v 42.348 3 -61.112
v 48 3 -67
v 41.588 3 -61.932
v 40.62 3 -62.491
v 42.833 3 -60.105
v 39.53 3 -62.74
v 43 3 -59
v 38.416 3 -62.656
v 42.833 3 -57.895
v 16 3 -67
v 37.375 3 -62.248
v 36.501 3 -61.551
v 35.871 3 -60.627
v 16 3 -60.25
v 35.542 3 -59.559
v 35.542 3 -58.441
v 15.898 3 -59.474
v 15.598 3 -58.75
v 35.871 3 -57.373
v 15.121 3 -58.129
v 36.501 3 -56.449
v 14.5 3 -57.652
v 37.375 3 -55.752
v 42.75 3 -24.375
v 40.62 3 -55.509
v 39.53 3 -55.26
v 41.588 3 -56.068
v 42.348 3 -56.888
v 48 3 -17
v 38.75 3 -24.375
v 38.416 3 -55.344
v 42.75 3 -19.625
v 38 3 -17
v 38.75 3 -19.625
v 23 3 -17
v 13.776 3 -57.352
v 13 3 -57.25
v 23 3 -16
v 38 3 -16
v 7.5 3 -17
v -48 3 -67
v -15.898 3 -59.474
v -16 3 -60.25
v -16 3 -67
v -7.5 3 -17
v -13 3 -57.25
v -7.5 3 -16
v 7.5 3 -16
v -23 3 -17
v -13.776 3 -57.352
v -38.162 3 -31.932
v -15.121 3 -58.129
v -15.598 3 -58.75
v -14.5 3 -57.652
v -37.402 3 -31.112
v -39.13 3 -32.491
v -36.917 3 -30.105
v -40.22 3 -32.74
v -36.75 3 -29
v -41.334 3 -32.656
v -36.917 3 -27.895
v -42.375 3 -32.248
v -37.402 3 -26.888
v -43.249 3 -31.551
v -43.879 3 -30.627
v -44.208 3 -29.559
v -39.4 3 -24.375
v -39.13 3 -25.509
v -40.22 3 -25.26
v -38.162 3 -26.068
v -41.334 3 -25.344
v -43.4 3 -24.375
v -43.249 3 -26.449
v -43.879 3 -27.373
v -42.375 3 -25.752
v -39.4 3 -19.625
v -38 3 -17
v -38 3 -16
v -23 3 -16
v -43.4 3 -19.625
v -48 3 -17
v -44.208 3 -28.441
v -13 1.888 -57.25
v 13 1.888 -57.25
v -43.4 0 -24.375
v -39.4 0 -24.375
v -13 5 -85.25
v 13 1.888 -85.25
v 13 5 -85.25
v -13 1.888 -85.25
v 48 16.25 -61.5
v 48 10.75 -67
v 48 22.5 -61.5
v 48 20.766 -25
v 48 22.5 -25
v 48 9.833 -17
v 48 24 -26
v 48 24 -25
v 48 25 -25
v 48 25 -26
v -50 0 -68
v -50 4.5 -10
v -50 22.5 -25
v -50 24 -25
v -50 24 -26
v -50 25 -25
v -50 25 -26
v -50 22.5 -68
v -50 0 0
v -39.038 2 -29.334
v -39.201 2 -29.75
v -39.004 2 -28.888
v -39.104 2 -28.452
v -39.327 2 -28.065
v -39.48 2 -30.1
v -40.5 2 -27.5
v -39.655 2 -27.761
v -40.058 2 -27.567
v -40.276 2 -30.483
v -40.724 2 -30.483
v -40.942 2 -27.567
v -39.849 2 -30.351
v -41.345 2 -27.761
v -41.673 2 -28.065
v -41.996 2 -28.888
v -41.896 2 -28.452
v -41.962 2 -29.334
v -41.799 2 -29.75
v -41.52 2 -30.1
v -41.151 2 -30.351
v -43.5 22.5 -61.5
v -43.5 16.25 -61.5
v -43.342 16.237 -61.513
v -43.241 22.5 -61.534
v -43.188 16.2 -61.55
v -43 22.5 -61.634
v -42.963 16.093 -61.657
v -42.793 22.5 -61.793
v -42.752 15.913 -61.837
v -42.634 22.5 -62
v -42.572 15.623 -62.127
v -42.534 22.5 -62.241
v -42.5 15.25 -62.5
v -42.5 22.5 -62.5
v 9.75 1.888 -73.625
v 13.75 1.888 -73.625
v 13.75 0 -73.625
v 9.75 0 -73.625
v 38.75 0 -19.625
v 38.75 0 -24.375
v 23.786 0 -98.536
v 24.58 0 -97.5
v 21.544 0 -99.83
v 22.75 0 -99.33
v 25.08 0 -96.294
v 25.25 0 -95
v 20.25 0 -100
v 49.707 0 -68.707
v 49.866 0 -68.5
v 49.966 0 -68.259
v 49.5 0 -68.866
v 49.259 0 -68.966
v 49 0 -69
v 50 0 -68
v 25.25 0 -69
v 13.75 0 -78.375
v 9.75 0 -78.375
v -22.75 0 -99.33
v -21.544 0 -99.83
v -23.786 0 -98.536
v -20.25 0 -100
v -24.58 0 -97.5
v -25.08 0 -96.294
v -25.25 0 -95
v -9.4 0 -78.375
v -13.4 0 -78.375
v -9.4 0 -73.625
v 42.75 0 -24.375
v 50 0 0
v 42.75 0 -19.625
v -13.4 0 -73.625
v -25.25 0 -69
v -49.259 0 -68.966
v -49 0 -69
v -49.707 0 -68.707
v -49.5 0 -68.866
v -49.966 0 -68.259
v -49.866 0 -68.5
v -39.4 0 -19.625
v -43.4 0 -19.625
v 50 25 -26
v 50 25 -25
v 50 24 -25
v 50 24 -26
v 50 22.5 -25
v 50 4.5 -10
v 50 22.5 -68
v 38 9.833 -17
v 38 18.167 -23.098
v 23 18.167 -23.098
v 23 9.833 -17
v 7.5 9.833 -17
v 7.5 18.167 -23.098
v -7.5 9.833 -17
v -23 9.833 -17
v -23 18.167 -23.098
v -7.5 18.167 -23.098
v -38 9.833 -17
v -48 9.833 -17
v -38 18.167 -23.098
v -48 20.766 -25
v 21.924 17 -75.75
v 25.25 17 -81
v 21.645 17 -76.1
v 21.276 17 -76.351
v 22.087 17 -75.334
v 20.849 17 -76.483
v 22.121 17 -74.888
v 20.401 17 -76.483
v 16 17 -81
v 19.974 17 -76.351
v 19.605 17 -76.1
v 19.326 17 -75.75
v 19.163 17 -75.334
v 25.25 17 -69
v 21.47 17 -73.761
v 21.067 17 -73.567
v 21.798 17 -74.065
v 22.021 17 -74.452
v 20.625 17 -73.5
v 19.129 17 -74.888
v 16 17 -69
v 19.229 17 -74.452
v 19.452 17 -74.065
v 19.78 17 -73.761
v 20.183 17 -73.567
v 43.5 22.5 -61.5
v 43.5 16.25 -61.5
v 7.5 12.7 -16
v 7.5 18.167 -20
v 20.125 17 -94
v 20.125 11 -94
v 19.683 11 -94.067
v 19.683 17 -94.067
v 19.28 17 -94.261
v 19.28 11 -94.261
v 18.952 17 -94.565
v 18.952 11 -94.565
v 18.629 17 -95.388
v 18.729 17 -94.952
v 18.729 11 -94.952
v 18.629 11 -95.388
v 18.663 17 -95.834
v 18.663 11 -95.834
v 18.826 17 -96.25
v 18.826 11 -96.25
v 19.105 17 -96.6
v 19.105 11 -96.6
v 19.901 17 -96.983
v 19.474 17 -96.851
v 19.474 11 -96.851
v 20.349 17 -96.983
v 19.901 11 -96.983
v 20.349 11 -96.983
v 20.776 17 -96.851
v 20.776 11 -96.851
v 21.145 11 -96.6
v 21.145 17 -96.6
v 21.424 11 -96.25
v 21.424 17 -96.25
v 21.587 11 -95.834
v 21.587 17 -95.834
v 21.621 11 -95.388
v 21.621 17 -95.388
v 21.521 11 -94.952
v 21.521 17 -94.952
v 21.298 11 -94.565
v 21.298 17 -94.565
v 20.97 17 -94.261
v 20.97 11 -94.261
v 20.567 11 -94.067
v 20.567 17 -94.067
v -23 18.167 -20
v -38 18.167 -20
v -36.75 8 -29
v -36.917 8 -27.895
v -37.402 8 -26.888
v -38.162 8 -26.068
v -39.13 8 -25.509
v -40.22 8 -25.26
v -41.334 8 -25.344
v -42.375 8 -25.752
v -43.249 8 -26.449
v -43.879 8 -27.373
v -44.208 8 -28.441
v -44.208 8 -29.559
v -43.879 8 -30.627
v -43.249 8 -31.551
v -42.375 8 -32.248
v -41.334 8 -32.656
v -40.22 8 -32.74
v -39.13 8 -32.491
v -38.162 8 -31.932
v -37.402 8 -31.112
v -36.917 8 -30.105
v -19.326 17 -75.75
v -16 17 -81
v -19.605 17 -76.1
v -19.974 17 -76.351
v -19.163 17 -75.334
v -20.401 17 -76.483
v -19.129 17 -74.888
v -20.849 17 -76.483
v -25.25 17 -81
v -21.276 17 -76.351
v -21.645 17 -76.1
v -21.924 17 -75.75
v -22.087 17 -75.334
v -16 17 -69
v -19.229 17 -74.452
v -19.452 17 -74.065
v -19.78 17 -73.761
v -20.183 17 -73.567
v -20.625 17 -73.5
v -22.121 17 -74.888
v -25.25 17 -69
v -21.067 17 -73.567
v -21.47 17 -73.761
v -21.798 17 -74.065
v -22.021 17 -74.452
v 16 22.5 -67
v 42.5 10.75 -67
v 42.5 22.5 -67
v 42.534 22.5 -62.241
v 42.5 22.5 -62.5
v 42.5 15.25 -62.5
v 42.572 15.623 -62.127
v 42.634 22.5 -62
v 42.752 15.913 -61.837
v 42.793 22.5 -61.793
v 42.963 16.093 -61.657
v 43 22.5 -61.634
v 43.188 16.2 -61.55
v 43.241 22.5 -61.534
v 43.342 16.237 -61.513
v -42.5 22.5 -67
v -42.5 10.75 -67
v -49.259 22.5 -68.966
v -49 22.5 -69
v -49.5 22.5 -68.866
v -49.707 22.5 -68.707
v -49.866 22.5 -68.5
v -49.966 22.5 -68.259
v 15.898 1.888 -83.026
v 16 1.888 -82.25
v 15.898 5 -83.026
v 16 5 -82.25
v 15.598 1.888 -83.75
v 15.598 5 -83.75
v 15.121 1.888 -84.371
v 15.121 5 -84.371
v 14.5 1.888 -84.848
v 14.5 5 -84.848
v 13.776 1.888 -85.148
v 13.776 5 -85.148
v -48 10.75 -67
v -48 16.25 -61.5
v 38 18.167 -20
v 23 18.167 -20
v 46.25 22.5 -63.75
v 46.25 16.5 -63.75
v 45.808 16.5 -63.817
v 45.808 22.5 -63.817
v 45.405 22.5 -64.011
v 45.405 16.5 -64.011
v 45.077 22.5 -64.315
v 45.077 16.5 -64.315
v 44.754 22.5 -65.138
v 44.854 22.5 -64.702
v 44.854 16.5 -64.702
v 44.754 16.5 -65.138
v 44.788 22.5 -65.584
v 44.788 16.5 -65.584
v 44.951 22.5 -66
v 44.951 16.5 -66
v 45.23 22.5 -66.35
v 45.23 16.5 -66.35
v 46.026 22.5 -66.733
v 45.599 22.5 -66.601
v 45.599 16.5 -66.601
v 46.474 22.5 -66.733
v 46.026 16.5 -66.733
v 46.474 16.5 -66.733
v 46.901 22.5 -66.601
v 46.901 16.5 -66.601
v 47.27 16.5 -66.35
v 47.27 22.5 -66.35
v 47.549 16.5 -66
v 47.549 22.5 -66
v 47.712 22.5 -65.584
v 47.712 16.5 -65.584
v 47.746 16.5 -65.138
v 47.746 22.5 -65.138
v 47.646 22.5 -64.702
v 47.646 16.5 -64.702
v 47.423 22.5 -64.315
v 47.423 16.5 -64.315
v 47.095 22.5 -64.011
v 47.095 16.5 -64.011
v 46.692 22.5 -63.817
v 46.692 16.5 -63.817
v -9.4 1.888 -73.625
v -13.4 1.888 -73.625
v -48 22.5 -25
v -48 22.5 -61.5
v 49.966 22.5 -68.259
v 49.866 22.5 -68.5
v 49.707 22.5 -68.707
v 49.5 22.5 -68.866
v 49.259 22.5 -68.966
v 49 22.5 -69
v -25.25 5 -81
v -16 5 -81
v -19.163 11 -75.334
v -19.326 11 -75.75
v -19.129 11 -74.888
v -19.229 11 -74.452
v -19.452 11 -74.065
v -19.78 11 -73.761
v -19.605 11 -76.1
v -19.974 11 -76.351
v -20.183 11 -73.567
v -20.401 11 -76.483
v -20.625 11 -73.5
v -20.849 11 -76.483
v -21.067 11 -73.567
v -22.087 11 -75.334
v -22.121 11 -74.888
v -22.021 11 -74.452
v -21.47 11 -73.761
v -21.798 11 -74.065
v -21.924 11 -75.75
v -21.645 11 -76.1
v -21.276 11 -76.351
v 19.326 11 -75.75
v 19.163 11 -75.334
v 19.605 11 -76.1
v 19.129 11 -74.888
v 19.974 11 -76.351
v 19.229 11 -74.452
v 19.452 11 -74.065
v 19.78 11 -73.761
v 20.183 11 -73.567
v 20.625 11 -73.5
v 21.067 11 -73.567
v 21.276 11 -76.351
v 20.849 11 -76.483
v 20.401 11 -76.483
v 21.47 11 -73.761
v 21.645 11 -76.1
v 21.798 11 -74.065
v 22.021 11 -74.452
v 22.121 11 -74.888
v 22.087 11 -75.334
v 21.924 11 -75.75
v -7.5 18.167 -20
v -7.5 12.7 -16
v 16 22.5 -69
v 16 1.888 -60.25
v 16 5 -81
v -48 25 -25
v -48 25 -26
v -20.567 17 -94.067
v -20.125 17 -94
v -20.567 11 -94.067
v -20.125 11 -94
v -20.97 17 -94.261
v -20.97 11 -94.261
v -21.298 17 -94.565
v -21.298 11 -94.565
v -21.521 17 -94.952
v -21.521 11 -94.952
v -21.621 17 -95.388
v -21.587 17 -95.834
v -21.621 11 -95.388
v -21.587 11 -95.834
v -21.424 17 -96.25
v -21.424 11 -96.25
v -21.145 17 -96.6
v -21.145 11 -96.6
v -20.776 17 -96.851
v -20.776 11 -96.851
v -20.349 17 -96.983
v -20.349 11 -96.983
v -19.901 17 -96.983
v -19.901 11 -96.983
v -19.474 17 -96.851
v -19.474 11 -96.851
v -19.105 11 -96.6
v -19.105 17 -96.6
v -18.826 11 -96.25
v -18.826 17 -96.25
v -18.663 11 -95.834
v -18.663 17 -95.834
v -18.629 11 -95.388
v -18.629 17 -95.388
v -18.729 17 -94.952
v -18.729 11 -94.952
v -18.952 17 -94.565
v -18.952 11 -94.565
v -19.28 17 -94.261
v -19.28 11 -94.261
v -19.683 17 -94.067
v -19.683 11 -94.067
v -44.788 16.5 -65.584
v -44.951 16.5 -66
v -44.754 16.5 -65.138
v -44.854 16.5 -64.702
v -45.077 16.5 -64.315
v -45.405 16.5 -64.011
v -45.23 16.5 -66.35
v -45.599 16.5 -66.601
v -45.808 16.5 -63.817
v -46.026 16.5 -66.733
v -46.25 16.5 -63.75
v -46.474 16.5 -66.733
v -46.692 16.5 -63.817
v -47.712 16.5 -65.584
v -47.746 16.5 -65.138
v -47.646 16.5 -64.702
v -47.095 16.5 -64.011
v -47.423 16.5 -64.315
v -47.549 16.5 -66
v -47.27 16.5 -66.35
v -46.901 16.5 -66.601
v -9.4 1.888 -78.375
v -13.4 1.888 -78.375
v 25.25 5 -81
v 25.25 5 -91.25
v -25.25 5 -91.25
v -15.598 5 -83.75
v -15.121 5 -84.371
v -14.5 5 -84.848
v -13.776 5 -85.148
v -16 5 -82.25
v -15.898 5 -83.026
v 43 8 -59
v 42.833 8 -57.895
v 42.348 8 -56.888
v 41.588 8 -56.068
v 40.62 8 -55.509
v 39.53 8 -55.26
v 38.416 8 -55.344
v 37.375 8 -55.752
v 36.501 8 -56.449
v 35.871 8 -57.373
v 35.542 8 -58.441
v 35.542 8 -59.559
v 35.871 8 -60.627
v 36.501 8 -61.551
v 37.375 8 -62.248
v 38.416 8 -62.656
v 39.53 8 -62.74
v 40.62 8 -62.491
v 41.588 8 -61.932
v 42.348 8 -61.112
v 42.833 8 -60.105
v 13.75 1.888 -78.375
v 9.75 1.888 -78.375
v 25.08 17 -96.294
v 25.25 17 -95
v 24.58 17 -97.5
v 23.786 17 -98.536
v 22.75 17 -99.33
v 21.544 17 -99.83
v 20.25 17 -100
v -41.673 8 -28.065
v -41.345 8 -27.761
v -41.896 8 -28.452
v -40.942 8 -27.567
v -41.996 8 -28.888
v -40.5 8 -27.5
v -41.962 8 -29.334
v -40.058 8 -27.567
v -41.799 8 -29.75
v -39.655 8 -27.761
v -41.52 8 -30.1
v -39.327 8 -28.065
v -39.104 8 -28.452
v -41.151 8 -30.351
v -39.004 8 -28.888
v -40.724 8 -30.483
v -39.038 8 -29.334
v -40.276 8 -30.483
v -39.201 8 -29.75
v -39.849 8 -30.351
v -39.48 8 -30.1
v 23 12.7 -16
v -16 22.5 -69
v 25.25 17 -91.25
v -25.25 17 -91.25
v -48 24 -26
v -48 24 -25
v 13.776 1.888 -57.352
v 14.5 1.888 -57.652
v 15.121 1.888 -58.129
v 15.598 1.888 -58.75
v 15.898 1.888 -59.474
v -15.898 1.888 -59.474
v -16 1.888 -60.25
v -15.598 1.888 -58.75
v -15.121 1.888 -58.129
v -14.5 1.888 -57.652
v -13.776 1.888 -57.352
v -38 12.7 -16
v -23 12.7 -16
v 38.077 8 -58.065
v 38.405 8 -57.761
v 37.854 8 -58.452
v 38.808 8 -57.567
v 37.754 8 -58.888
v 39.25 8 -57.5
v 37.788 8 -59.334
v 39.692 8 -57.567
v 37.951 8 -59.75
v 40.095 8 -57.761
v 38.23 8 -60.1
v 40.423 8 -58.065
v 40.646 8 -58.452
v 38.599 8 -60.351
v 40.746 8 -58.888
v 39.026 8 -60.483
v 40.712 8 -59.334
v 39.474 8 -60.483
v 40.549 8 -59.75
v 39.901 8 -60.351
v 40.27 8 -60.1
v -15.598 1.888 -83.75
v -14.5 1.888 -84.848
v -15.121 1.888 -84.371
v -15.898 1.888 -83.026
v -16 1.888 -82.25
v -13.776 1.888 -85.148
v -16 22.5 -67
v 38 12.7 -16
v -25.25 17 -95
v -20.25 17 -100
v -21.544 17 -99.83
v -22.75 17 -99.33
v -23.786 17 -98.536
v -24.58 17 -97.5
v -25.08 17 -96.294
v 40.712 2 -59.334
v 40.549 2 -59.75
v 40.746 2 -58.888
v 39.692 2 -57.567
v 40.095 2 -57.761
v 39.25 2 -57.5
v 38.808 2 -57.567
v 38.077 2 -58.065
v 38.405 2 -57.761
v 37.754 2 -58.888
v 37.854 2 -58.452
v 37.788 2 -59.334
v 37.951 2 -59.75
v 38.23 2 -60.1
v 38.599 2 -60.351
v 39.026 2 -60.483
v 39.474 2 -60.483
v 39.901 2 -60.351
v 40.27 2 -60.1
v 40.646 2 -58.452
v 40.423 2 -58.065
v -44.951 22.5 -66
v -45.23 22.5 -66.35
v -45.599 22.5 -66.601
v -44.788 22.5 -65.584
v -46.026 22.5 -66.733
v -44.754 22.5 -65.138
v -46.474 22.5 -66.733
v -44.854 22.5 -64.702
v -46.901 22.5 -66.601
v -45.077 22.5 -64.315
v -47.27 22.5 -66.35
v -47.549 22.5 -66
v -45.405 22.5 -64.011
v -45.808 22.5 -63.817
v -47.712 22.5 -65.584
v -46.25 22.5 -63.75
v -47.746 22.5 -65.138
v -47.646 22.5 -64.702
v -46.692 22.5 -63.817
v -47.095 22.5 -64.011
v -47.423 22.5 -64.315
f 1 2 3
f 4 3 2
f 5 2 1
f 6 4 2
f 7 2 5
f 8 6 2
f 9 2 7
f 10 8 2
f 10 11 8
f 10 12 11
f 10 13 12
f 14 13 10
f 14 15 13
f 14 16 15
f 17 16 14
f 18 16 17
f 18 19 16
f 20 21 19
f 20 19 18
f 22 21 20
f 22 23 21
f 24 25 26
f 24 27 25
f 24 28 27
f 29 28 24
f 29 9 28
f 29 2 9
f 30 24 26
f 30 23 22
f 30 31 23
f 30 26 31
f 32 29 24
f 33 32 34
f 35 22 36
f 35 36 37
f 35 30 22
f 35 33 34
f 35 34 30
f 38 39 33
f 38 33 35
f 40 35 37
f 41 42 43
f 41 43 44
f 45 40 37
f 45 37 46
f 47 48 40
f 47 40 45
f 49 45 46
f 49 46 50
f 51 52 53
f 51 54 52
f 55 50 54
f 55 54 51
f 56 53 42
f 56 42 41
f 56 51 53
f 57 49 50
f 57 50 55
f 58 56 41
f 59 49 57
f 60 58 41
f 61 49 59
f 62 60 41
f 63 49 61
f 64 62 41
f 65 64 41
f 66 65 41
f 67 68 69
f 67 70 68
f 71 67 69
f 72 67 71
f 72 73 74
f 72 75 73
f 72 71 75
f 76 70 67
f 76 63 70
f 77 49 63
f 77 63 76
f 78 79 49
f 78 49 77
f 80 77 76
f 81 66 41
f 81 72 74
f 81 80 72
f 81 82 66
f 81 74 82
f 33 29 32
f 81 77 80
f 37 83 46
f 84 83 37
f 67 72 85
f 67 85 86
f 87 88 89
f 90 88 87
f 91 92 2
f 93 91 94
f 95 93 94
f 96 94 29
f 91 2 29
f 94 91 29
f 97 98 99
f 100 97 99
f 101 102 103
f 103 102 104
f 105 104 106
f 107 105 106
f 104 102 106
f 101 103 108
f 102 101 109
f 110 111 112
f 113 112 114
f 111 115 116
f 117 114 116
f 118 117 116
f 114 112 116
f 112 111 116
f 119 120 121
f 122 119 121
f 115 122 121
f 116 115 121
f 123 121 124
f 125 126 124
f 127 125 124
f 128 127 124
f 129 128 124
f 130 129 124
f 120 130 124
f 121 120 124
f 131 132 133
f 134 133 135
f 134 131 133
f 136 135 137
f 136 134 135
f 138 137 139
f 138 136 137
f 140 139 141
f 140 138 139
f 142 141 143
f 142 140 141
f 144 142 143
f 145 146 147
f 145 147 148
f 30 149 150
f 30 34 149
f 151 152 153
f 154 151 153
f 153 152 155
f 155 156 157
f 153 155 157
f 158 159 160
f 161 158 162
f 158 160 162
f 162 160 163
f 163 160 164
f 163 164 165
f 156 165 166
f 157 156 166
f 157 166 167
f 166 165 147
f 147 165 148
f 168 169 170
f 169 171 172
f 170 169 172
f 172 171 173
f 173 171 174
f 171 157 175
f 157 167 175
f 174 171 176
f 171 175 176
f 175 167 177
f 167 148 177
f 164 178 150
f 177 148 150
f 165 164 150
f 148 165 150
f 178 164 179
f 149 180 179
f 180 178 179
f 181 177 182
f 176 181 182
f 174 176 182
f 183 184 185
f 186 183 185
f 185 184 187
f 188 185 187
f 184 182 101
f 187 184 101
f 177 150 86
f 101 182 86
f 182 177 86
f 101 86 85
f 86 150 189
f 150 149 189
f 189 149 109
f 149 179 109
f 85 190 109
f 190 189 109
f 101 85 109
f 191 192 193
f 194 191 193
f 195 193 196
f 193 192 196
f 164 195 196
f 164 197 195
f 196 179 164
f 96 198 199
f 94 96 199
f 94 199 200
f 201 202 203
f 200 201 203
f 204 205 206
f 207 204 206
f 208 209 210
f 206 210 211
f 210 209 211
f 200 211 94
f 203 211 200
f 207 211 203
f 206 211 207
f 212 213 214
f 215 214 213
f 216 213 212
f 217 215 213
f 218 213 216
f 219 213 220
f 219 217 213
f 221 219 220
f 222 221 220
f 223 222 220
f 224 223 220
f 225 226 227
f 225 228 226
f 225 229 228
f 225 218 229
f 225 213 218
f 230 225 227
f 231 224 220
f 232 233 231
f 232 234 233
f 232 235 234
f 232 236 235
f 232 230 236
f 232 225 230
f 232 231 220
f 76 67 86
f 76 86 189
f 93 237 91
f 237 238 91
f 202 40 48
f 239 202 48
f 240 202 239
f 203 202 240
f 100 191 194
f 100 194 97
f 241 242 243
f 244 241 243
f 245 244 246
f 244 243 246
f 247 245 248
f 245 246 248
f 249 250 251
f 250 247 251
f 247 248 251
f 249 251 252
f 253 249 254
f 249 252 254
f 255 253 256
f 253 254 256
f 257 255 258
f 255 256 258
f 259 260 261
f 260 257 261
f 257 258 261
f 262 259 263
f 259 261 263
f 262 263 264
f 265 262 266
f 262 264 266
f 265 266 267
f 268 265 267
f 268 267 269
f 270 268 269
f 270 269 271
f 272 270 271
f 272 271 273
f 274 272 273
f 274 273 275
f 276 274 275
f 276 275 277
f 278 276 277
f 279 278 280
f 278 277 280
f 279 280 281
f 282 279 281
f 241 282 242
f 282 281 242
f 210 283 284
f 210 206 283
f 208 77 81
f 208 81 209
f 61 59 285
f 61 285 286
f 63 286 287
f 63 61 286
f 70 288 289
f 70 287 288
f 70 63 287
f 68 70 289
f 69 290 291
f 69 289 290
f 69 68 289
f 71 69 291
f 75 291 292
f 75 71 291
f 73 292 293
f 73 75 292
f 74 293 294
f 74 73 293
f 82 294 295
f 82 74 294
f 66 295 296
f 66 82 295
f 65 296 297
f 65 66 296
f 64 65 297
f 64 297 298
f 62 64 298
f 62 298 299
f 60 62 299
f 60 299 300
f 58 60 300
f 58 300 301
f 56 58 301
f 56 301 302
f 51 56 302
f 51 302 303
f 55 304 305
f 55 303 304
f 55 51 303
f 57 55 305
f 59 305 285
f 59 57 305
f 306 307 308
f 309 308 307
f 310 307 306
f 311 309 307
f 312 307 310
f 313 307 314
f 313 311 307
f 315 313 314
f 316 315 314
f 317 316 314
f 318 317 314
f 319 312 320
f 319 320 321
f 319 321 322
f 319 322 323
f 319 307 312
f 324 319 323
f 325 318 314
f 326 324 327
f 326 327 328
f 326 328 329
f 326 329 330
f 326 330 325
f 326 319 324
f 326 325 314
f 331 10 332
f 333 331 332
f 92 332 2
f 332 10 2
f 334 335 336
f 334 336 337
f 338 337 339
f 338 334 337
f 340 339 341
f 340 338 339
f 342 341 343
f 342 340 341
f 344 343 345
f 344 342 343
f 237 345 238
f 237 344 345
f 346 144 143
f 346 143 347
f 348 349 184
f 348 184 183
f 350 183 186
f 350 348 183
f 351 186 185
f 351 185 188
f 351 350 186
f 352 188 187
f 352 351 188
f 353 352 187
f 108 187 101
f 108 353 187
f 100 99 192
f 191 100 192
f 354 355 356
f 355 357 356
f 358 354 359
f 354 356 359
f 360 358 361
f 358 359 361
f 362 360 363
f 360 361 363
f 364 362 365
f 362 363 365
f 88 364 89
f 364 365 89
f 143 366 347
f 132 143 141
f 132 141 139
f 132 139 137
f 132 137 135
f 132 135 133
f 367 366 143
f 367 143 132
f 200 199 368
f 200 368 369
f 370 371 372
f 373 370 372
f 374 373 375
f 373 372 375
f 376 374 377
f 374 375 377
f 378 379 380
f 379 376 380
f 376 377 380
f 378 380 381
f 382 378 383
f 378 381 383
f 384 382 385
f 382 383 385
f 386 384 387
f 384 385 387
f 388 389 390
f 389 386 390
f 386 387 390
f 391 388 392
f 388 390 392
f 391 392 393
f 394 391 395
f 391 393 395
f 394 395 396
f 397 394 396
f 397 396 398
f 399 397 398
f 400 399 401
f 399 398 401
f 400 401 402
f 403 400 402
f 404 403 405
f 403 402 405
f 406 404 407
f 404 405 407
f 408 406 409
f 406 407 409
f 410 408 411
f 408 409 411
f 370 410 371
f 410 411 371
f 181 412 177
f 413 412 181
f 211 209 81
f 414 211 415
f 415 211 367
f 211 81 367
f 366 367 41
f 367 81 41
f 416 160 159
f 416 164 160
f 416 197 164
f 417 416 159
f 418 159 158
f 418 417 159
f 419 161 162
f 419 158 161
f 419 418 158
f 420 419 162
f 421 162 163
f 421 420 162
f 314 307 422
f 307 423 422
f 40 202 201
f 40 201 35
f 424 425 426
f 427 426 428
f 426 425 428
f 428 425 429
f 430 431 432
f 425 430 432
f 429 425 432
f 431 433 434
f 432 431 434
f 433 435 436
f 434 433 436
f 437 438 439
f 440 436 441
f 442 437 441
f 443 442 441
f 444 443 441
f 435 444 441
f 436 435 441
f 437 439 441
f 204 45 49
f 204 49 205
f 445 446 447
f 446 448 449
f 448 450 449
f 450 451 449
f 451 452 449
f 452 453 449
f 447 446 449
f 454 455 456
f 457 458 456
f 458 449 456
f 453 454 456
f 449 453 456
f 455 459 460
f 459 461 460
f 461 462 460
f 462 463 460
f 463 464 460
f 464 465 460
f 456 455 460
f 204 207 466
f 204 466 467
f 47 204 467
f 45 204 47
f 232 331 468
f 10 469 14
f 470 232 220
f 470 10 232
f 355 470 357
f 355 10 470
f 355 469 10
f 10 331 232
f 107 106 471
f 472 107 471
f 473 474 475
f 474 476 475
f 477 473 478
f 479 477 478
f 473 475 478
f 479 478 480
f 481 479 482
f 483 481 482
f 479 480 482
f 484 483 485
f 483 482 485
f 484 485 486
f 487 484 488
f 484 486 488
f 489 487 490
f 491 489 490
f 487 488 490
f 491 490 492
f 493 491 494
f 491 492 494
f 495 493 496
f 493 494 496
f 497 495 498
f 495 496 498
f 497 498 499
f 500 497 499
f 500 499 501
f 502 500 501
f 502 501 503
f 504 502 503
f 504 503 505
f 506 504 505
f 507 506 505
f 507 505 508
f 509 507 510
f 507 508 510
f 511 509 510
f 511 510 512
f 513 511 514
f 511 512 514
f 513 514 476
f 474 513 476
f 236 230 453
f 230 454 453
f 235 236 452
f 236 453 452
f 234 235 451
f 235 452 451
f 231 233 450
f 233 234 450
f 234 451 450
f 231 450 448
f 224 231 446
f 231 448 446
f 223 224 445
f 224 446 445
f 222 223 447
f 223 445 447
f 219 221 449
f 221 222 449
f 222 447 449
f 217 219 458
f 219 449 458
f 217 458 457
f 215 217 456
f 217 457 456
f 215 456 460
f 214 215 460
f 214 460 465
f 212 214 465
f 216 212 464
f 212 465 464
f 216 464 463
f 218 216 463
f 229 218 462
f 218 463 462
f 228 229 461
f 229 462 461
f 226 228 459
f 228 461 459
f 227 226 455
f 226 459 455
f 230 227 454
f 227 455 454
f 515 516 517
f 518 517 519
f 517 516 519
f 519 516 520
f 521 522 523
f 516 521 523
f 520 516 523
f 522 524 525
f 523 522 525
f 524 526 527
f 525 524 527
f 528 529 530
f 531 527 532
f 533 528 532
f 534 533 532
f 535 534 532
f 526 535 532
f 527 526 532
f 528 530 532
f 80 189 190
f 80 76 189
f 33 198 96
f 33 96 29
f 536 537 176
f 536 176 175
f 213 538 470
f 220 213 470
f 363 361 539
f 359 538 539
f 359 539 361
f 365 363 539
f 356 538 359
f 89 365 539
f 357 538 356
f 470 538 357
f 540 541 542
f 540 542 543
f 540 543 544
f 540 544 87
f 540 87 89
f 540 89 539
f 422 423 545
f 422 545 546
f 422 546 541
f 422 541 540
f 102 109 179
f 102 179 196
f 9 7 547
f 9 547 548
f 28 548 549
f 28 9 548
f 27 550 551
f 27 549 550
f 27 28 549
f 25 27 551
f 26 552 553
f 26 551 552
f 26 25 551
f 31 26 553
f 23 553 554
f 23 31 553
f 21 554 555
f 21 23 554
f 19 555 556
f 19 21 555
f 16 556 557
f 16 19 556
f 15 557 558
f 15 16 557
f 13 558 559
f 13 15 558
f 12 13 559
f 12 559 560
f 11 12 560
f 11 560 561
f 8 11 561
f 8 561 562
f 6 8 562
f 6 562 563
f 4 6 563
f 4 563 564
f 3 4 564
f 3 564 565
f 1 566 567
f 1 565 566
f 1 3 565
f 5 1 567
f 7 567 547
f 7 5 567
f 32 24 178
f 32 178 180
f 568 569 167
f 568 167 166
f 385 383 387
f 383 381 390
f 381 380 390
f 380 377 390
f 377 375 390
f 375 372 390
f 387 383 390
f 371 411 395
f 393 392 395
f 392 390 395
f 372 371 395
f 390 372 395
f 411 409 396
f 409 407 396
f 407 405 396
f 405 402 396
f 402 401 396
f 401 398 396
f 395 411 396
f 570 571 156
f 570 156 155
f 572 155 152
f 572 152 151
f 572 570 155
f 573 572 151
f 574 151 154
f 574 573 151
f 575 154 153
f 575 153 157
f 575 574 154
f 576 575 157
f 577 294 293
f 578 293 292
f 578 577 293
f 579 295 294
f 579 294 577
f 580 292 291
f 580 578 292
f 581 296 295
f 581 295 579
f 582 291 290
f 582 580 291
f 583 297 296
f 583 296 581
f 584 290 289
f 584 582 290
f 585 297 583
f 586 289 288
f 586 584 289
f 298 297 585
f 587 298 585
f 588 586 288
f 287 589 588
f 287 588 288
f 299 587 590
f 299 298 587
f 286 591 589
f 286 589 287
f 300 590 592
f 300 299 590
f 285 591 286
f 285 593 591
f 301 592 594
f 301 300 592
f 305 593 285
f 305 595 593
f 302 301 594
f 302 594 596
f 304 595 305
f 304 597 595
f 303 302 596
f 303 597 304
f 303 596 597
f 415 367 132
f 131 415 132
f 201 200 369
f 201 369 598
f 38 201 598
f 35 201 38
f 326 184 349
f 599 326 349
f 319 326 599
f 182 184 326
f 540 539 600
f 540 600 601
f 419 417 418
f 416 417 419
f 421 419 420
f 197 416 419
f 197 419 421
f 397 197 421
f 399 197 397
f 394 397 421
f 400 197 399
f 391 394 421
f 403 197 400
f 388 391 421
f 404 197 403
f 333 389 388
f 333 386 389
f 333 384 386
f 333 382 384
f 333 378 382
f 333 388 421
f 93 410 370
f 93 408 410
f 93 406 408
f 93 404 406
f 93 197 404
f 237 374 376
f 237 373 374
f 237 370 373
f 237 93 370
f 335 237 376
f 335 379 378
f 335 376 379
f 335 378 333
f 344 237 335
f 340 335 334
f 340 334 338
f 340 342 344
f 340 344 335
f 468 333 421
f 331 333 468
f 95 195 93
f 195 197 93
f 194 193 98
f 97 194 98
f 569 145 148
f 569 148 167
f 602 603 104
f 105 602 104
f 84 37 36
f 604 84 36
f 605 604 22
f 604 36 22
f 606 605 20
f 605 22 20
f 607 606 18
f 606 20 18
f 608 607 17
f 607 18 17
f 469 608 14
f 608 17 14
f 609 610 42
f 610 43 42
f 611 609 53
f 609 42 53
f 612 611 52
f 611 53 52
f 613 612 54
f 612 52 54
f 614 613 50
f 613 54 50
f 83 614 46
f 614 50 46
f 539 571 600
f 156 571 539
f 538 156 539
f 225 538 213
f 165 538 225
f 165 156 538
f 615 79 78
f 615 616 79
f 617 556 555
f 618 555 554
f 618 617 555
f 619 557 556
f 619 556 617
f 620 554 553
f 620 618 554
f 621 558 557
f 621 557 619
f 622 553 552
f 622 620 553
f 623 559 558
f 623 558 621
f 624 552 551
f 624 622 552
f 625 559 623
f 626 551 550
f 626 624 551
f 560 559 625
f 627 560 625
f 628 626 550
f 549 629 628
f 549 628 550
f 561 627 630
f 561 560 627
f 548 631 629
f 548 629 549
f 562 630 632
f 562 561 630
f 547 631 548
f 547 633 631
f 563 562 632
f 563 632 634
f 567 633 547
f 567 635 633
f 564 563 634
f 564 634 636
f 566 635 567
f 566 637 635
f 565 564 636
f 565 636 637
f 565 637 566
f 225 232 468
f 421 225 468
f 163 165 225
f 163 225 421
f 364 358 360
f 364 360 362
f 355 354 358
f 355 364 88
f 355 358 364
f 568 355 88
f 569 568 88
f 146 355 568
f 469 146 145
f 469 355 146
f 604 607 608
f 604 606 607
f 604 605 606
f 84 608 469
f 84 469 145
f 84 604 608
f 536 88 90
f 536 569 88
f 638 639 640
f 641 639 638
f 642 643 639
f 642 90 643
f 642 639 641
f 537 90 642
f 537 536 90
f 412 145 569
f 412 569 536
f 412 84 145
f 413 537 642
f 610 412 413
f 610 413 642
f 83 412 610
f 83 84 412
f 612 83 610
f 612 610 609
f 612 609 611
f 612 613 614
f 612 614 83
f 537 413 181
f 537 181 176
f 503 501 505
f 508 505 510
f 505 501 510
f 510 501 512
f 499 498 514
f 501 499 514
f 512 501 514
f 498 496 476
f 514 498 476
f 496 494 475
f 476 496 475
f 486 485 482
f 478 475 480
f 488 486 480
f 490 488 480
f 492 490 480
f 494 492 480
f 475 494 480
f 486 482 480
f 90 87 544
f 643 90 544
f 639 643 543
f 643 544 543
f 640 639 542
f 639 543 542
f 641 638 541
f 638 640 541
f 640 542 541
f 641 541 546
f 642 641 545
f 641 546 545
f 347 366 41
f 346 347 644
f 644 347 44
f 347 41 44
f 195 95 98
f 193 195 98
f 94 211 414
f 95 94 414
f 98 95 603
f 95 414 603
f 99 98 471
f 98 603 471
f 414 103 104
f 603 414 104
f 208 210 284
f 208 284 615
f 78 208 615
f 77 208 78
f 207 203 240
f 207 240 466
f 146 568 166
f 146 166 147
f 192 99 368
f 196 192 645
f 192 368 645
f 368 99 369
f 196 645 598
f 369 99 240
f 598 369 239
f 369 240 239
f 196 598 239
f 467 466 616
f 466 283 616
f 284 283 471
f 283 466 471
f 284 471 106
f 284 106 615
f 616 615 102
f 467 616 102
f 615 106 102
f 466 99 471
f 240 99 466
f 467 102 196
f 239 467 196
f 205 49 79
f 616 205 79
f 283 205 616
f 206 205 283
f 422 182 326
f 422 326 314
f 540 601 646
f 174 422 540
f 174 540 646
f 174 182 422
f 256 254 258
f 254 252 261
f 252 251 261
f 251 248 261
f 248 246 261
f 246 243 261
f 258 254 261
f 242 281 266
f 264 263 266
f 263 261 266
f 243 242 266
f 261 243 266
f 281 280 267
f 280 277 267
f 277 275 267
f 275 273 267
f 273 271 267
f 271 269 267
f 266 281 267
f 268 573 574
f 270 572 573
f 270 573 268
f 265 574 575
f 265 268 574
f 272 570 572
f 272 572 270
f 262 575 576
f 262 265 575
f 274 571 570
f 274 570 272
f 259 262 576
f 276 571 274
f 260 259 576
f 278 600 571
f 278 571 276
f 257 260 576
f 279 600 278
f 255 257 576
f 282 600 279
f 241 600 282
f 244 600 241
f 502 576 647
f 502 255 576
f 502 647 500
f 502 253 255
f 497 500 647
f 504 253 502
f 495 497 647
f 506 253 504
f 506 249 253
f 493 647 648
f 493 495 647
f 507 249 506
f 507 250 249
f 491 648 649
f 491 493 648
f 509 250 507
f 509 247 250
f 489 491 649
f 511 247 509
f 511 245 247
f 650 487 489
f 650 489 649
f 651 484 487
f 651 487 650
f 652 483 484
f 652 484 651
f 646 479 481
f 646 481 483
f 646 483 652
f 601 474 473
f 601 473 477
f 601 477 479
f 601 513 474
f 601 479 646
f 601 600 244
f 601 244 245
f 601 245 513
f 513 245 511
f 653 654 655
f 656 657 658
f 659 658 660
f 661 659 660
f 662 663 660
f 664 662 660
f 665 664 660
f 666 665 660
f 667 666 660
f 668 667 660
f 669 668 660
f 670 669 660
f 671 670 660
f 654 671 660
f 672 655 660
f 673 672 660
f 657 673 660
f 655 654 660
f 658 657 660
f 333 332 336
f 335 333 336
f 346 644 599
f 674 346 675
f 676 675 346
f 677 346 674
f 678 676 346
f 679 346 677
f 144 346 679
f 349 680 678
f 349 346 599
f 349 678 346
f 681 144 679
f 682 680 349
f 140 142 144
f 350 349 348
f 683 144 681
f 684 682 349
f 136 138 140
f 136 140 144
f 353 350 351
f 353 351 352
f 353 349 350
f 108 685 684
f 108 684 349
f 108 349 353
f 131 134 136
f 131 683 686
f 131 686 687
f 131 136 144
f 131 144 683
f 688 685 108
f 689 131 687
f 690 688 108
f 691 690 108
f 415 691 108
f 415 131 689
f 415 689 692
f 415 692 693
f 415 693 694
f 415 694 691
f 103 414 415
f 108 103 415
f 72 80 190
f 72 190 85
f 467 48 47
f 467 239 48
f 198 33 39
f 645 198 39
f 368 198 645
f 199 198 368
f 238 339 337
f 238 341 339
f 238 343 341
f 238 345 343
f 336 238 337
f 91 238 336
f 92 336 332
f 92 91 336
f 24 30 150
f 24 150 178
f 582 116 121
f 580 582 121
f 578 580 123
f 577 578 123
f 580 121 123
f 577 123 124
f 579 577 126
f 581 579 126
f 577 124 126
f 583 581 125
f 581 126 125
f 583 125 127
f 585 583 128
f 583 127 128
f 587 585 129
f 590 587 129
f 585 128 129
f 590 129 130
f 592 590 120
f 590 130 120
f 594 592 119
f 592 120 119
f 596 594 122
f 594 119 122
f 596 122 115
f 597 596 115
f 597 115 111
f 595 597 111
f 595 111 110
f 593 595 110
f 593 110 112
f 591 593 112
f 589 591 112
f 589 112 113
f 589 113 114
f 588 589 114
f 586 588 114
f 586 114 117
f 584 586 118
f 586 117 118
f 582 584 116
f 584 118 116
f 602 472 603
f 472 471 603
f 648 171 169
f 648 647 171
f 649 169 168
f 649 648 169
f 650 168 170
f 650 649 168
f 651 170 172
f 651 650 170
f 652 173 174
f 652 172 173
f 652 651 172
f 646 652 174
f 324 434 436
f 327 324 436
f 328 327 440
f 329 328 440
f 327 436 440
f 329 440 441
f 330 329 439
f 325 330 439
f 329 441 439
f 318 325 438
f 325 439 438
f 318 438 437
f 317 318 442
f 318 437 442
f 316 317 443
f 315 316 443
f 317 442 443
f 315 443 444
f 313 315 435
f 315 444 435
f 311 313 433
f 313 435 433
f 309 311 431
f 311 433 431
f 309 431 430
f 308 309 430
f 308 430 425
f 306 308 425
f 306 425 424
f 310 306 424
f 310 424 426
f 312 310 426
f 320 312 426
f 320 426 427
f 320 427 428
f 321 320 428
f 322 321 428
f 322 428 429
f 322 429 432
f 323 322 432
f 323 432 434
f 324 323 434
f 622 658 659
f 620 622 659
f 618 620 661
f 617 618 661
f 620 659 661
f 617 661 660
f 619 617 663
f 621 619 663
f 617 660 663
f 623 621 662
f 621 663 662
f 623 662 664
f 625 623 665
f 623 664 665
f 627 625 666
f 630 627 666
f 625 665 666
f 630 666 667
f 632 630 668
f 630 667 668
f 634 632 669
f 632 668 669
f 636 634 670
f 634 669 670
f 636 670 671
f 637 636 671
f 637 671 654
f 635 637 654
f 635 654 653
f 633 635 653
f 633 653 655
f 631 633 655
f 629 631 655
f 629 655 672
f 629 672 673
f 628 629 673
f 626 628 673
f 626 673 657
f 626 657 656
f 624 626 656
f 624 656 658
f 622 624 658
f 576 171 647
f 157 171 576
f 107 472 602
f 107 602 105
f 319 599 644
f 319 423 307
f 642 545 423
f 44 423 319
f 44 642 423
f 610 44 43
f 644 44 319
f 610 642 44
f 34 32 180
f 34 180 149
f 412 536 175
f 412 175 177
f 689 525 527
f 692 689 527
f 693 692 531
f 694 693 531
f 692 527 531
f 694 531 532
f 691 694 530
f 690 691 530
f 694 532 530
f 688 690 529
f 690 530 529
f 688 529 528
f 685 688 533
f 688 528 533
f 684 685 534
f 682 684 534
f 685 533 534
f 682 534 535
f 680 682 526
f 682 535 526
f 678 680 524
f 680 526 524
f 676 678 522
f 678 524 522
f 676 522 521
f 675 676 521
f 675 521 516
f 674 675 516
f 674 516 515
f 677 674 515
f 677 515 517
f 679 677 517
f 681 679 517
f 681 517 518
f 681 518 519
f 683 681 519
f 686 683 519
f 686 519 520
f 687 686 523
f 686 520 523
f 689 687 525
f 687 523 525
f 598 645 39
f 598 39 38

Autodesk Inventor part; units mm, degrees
ref_plane "YZ Plane" through (0, 0, 0) normal (1, 0, 0) x (0, 1, 0)
ref_plane "XZ Plane" through (0, 0, 0) normal (0, 1, 0) x (-1, 0, 0)
ref_plane "XY Plane" through (0, 0, 0) normal (0, 0, 1) x (1, 0, 0)
sketch "Náčrt1" plane through (0, 0, 0) normal (0, 1, 0) x (-1, 0, 0)
  line L0 (0, 0) -> (50, 0)
  line L1 (50, 0) -> (50, -69)
  line L2 (50, -69) -> (16, -69)
  line L3 (16, -69) -> (16, -81)
  line L4 (16, -81) -> (25.25, -81)
  line L5 (25.25, -81) -> (25.25, -69)
  line L6 (25.25, -81) -> (25.25, -91.25)
  line L7 (25.25, -91.25) -> (25.25, -100)
  line L8 (25.25, -100) -> (0, -100)
  line L9 (0, -100) -> (0, -91.25)
  line L10 (0, -91.25) -> (25.25, -91.25)
  line L11 (0, -91.25) -> (0, -85.25)
  line L12 (0, -85.25) -> (16, -85.25)
  line L13 (16, -85.25) -> (16, -81)
  line L14 (0, -85.25) -> (0, 0)
  line L15 (16, -69) -> (16, -57.25)
  line L16 (16, -57.25) -> (0, -57.25)
  line L17 (48, -25) -> (48, -61.5)
  line L18 (48, -61.5) -> (42.5, -61.5)
  line L19 (42.5, -61.5) -> (42.5, -67)
  line L20 (42.5, -67) -> (16, -67)
  line L21 (0, -25) -> (48, -25)
  dimension "d0" = 50
  dimension "d1" = 69
  dimension "d2" = 12
  dimension "d3" = 10.25
  dimension "d4" = 8.75
  dimension "d5" = 25.25
  dimension "d6" = 16
  dimension "d7" = 6
  dimension "d9" = 2
  dimension "d10" = 7.5
  dimension "d11" = 7.5
  dimension "d12" = 28
  dimension "d13" = 25
  dimension "d18" = 2
extrude "Vysunutí1" add sketch "Náčrt1" along normal blind 3 contours L21 L17 L18 L19 L20 L15 L16 L14
extrude "Vysunutí2" add sketch "Náčrt1" along normal blind 1.888 contours L16 L15 L3 L13 L12 L14
extrude "Vysunutí3" add sketch "Náčrt1" along normal blind 22.5 contours L0 L1 L2 L15 L20 L19 L18 L17 L21 L14
extrude "Vysunutí4" add sketch "Náčrt1" along normal blind 17 contours L5 L4 L3 L2 | L10 L7 L8 L9
extrude "Vysunutí15" add sketch "Náčrt1" along normal blind 5 contours L12 L13 L4 L6 L10 L11
sketch "Náčrt15" plane through (-48, 3, -61.5) normal (1, 0, 0) x (0, 0, -1)
  line L0 (5.5, 0) -> (5.5, 19.5) projected
  line L1 (0, 0) -> (0, 19.5) projected
  line L2 (0, 0) -> (5.5, 0)
  line L3 (5.5, 0) -> (5.5, 7.75)
  line L4 (5.5, 0) -> (5.5, 19.5) projected
  line L5 (5.5, 7.75) -> (0, 13.25)
  line L6 (0, 0) -> (0, 13.25)
  line L7 (0, 19.5) -> (5.5, 19.5) projected
  line L8 (0, 0) -> (-36.5, 0) projected
  point P0 (-61.5, -3)
  point P1 (5.5, 7.75)
  point P2 (2.75, 19.5)
  point P3 (2.75, 10.5)
  dimension "d107" = 45
  dimension "d110" = 9
extrude "Vysunutí14" cut sketch "Náčrt15" along normal up to surface (5.5 mm away) contours L2 L1 L5 L0
sketch "Náčrt2" plane through (-50, 0, -69) normal (-1, 0, 0) x (0, 0, 1)
  line L0 (69, 0) -> (69, 22.5) projected
  line L1 (69, 0) -> (59, 4.5)
  line L2 (0, 0) -> (69, 0) projected
  line L3 (44, 0) -> (44, 22.5)
  line L4 (44, 3) -> (44, 22.5) projected
  line L5 (44, 22.5) -> (44, 25)
  line L6 (44, 25) -> (59, 4.5)
  line L7 (0, 22.5) -> (69, 22.5) projected
  point P0 (45.8293, 22.5)
  dimension "d23" = 25
  dimension "d24" = 4.5
  dimension "d25" = 10
extrude "Vysunutí5" cut sketch "Náčrt2" against normal through all contours L1 L6 L7 L0
extrude "Vysunutí6" add sketch "Náčrt2" against normal up to surface (50 mm away) contours L7 L5 L6
sketch "Náčrt3" plane through (0, 3, -25) normal (0, 0, -1) x (-1, 0, 0)
  line L0 (23, 15.167) -> (38, 15.167)
  line L1 (38, 15.167) -> (38, 0)
  line L2 (38, 0) -> (23, 0)
  line L3 (23, 0) -> (23, 15.167)
  line L4 (0, 15.167) -> (7.5, 15.167)
  line L5 (7.5, 15.167) -> (7.5, 0)
  line L6 (7.5, 0) -> (0, 0)
  line L7 (0, 0) -> (0, 15.167)
  line L8 (50, -3) -> (0, -3) projected
  dimension "d30" = 15
  dimension "d31" = 7.5
  dimension "d32" = 15.167
  dimension "d33" = 3
  dimension "d34" = 15.5
extrude "Vysunutí7" cut sketch "Náčrt3" against normal blind 9
sketch "Náčrt7" plane through (-48, 3, -61.5) normal (1, 0, 0) x (0, 0, -1)
  line L0 (-51.5, 1.5) -> (-36.5, 22) projected
  line L1 (-36.5, 15.167) -> (-36.5, 0) projected
  line L2 (-36.5, 0) -> (-44.5, 0)
  line L3 (-36.5, 0) -> (-45.5, 0) projected
  line L4 (-44.5, 0) -> (-44.5, 6.833)
  line L5 (-44.5, 6.833) -> (-36.5, 17.7664)
  line L6 (-36.5, 17.7664) -> (-36.5, 0)
  point P0 (-61.5, -3)
  point P1 (-38.3293, 19.5)
  point P2 (-44.5, 0)
  point P3 (-36.5, 2)
  point P4 (-36.5, 2)
  dimension "d45" = 8
  dimension "d46" = 2.5
extrude "Vysunutí9" cut sketch "Náčrt7" along normal through all
sketch "Náčrt11" plane through (-48, 22.5, -25) normal (0, 0, -1) x (-1, 0, 0)
  line L0 (2, -18) -> (2, 2.5) projected
  line L1 (2, 2.5) -> (0, 2.5)
  line L2 (0, 2.5) -> (0, 1.5)
  line L3 (0, 1.5) -> (2, 1.5)
  point P0 (-48, -22.5)
  point P1 (0, 0)
  point P2 (-2, 0)
  dimension "d69" = 1
extrude "Vysunutí13" add sketch "Náčrt11" along normal blind 1
sketch "Náčrt12" plane through (0, 22.5, 0) normal (0, 1, 0) x (1, 0, 0)
  line L0 (-16, 69) -> (-50, 69) projected
  line L1 (-50, 69) -> (-50, 23.1707) projected
  point P0 (0, 0)
  point P1 (-46.25, 65.25)
  point P2 (-50, 25)
  dimension "d75" = 3.75
  dimension "d76" = 3.75
hole "Díra1" at (-46.25, 22.5, -65.25) direction (0, -1, 0) diameter 3 depth 6
sketch "Náčrt13" plane through (0, 17, 0) normal (0, 1, 0) x (1, 0, 0)
  line L0 (-16, 81) -> (-25.25, 81) projected
  line L1 (-25.25, 81) -> (-25.25, 69) projected
  point P0 (0, 0)
  point P1 (-20.625, 75)
  dimension "d84" = 6
  dimension "d85" = 4.625
hole "Díra2" at (-20.625, 17, -75) direction (0, -1, 0) diameter 3 depth 6
sketch "Náčrt14" plane through (0, 17, 0) normal (0, 1, 0) x (1, 0, 0)
  line L0 (-25.25, 100) -> (-25.25, 91.25) projected
  line L1 (0, 100) -> (-25.25, 100) projected
  point P0 (0, 0)
  point P1 (-20.125, 95.5)
  dimension "d93" = 5.125
  dimension "d101" = 4.5
hole "Díra3" at (-20.125, 17, -95.5) direction (0, -1, 0) diameter 3 depth 6
fillet "Zaoblení1" radius 3 2 edges at (-16, 2.444, -57.25) (-16, 3.444, -85.25)
fillet "Zaoblení2" radius 1 2 edges at (-42.5, 19.375, -61.5) (-50, 11.25, -69)
fillet "Zaoblení3" radius 5 1 edges at (-25.25, 8.5, -100)
mirror "Zrcadlit1" about plane through (0, 0, -25) normal (1, 0, 0)
sketch "Náčrt16" plane through (0, 1.888, 0) normal (0, 1, 0) x (1, 0, 0)
  line L0 (-9.4, 73.625) -> (-13.4, 73.625)
  line L1 (-13.4, 73.625) -> (-13.4, 78.375)
  line L2 (-13.4, 78.375) -> (-9.4, 78.375)
  line L3 (-9.4, 78.375) -> (-9.4, 73.625)
  line L4 (-16, 69) -> (-16, 81) projected
  line L5 (-13, 85.25) -> (13, 85.25) projected
  line L6 (13.75, 73.625) -> (9.75, 73.625)
  line L7 (9.75, 73.625) -> (9.75, 78.375)
  line L8 (9.75, 78.375) -> (13.75, 78.375)
  line L9 (13.75, 78.375) -> (13.75, 73.625)
  line L10 (16, 69) -> (16, 81) projected
  point P0 (0, 0)
  dimension "d128" = 4
  dimension "d129" = 4.75
  dimension "d130" = 2.6
  dimension "d131" = 6.875
  dimension "d134" = 2.25
extrude "Vysunutí16" cut sketch "Náčrt16" against normal through all
sketch "Náčrt17" plane through (0, 3, 0) normal (0, 1, 0) x (1, 0, 0)
  line L0 (-48, 17) -> (-38, 17) projected
  line L1 (-48, 17) -> (-48, 67) projected
  line L2 (48, 17) -> (38, 17) projected
  line L3 (48, 17) -> (48, 67) projected
  line L4 (-39.4, 19.625) -> (-43.4, 19.625)
  line L5 (-43.4, 19.625) -> (-43.4, 24.375)
  line L6 (-43.4, 24.375) -> (-39.4, 24.375)
  line L7 (-39.4, 24.375) -> (-39.4, 19.625)
  line L8 (42.75, 19.625) -> (38.75, 19.625)
  line L9 (38.75, 19.625) -> (38.75, 24.375)
  line L10 (38.75, 24.375) -> (42.75, 24.375)
  line L11 (42.75, 24.375) -> (42.75, 19.625)
  point P0 (0, 0)
  point P1 (-41.4, 19.625)
  point P2 (40.75, 19.625)
  dimension "d137" = 4
  dimension "d138" = 4.75
  dimension "d139" = 4.6
  dimension "d143" = 2.625
  dimension "d144" = 5.25
  dimension "d146" = 2.625
extrude "Vysunutí17" cut sketch "Náčrt17" against normal through all
sketch "Náčrt18" plane through (0, 3, 0) normal (0, 1, 0) x (1, 0, 0)
  circle A0 centre (39.25, 59) radius 3.75
  circle A1 centre (-40.5, 29) radius 3.75
  line L0 (42.5, 67) -> (16, 67) projected
  line L1 (48, 25) -> (48, 61.5) projected
  line L2 (-48, 17) -> (-38, 17) projected
  line L3 (-48, 17) -> (-48, 67) projected
  point P0 (0, 0)
  dimension "d149" = 7.5
  dimension "d150" = 8
  dimension "d151" = 8.75
  dimension "d152" = 12
  dimension "d153" = 7.5
extrude "Vysunutí18" add sketch "Náčrt18" along normal blind 5
sketch "Náčrt19" plane through (39.25, 8, -59) normal (0, 1, 0) x (1, 0, 0)
  circle A0 centre (0, 0) radius 3.75 projected
  point P0 (-39.25, -59)
hole "Díra4" at (39.25, 8, -59) direction (0, -1, 0) diameter 3 depth 6
sketch "Náčrt20" plane through (-40.5, 8, -29) normal (0, 1, 0) x (1, 0, 0)
  circle A0 centre (0, 0) radius 3.75 projected
  point P0 (40.5, -29)
hole "Díra5" at (-40.5, 8, -29) direction (0, -1, 0) diameter 3 depth 6
properties part number "Sumec_telo_V4.1"
